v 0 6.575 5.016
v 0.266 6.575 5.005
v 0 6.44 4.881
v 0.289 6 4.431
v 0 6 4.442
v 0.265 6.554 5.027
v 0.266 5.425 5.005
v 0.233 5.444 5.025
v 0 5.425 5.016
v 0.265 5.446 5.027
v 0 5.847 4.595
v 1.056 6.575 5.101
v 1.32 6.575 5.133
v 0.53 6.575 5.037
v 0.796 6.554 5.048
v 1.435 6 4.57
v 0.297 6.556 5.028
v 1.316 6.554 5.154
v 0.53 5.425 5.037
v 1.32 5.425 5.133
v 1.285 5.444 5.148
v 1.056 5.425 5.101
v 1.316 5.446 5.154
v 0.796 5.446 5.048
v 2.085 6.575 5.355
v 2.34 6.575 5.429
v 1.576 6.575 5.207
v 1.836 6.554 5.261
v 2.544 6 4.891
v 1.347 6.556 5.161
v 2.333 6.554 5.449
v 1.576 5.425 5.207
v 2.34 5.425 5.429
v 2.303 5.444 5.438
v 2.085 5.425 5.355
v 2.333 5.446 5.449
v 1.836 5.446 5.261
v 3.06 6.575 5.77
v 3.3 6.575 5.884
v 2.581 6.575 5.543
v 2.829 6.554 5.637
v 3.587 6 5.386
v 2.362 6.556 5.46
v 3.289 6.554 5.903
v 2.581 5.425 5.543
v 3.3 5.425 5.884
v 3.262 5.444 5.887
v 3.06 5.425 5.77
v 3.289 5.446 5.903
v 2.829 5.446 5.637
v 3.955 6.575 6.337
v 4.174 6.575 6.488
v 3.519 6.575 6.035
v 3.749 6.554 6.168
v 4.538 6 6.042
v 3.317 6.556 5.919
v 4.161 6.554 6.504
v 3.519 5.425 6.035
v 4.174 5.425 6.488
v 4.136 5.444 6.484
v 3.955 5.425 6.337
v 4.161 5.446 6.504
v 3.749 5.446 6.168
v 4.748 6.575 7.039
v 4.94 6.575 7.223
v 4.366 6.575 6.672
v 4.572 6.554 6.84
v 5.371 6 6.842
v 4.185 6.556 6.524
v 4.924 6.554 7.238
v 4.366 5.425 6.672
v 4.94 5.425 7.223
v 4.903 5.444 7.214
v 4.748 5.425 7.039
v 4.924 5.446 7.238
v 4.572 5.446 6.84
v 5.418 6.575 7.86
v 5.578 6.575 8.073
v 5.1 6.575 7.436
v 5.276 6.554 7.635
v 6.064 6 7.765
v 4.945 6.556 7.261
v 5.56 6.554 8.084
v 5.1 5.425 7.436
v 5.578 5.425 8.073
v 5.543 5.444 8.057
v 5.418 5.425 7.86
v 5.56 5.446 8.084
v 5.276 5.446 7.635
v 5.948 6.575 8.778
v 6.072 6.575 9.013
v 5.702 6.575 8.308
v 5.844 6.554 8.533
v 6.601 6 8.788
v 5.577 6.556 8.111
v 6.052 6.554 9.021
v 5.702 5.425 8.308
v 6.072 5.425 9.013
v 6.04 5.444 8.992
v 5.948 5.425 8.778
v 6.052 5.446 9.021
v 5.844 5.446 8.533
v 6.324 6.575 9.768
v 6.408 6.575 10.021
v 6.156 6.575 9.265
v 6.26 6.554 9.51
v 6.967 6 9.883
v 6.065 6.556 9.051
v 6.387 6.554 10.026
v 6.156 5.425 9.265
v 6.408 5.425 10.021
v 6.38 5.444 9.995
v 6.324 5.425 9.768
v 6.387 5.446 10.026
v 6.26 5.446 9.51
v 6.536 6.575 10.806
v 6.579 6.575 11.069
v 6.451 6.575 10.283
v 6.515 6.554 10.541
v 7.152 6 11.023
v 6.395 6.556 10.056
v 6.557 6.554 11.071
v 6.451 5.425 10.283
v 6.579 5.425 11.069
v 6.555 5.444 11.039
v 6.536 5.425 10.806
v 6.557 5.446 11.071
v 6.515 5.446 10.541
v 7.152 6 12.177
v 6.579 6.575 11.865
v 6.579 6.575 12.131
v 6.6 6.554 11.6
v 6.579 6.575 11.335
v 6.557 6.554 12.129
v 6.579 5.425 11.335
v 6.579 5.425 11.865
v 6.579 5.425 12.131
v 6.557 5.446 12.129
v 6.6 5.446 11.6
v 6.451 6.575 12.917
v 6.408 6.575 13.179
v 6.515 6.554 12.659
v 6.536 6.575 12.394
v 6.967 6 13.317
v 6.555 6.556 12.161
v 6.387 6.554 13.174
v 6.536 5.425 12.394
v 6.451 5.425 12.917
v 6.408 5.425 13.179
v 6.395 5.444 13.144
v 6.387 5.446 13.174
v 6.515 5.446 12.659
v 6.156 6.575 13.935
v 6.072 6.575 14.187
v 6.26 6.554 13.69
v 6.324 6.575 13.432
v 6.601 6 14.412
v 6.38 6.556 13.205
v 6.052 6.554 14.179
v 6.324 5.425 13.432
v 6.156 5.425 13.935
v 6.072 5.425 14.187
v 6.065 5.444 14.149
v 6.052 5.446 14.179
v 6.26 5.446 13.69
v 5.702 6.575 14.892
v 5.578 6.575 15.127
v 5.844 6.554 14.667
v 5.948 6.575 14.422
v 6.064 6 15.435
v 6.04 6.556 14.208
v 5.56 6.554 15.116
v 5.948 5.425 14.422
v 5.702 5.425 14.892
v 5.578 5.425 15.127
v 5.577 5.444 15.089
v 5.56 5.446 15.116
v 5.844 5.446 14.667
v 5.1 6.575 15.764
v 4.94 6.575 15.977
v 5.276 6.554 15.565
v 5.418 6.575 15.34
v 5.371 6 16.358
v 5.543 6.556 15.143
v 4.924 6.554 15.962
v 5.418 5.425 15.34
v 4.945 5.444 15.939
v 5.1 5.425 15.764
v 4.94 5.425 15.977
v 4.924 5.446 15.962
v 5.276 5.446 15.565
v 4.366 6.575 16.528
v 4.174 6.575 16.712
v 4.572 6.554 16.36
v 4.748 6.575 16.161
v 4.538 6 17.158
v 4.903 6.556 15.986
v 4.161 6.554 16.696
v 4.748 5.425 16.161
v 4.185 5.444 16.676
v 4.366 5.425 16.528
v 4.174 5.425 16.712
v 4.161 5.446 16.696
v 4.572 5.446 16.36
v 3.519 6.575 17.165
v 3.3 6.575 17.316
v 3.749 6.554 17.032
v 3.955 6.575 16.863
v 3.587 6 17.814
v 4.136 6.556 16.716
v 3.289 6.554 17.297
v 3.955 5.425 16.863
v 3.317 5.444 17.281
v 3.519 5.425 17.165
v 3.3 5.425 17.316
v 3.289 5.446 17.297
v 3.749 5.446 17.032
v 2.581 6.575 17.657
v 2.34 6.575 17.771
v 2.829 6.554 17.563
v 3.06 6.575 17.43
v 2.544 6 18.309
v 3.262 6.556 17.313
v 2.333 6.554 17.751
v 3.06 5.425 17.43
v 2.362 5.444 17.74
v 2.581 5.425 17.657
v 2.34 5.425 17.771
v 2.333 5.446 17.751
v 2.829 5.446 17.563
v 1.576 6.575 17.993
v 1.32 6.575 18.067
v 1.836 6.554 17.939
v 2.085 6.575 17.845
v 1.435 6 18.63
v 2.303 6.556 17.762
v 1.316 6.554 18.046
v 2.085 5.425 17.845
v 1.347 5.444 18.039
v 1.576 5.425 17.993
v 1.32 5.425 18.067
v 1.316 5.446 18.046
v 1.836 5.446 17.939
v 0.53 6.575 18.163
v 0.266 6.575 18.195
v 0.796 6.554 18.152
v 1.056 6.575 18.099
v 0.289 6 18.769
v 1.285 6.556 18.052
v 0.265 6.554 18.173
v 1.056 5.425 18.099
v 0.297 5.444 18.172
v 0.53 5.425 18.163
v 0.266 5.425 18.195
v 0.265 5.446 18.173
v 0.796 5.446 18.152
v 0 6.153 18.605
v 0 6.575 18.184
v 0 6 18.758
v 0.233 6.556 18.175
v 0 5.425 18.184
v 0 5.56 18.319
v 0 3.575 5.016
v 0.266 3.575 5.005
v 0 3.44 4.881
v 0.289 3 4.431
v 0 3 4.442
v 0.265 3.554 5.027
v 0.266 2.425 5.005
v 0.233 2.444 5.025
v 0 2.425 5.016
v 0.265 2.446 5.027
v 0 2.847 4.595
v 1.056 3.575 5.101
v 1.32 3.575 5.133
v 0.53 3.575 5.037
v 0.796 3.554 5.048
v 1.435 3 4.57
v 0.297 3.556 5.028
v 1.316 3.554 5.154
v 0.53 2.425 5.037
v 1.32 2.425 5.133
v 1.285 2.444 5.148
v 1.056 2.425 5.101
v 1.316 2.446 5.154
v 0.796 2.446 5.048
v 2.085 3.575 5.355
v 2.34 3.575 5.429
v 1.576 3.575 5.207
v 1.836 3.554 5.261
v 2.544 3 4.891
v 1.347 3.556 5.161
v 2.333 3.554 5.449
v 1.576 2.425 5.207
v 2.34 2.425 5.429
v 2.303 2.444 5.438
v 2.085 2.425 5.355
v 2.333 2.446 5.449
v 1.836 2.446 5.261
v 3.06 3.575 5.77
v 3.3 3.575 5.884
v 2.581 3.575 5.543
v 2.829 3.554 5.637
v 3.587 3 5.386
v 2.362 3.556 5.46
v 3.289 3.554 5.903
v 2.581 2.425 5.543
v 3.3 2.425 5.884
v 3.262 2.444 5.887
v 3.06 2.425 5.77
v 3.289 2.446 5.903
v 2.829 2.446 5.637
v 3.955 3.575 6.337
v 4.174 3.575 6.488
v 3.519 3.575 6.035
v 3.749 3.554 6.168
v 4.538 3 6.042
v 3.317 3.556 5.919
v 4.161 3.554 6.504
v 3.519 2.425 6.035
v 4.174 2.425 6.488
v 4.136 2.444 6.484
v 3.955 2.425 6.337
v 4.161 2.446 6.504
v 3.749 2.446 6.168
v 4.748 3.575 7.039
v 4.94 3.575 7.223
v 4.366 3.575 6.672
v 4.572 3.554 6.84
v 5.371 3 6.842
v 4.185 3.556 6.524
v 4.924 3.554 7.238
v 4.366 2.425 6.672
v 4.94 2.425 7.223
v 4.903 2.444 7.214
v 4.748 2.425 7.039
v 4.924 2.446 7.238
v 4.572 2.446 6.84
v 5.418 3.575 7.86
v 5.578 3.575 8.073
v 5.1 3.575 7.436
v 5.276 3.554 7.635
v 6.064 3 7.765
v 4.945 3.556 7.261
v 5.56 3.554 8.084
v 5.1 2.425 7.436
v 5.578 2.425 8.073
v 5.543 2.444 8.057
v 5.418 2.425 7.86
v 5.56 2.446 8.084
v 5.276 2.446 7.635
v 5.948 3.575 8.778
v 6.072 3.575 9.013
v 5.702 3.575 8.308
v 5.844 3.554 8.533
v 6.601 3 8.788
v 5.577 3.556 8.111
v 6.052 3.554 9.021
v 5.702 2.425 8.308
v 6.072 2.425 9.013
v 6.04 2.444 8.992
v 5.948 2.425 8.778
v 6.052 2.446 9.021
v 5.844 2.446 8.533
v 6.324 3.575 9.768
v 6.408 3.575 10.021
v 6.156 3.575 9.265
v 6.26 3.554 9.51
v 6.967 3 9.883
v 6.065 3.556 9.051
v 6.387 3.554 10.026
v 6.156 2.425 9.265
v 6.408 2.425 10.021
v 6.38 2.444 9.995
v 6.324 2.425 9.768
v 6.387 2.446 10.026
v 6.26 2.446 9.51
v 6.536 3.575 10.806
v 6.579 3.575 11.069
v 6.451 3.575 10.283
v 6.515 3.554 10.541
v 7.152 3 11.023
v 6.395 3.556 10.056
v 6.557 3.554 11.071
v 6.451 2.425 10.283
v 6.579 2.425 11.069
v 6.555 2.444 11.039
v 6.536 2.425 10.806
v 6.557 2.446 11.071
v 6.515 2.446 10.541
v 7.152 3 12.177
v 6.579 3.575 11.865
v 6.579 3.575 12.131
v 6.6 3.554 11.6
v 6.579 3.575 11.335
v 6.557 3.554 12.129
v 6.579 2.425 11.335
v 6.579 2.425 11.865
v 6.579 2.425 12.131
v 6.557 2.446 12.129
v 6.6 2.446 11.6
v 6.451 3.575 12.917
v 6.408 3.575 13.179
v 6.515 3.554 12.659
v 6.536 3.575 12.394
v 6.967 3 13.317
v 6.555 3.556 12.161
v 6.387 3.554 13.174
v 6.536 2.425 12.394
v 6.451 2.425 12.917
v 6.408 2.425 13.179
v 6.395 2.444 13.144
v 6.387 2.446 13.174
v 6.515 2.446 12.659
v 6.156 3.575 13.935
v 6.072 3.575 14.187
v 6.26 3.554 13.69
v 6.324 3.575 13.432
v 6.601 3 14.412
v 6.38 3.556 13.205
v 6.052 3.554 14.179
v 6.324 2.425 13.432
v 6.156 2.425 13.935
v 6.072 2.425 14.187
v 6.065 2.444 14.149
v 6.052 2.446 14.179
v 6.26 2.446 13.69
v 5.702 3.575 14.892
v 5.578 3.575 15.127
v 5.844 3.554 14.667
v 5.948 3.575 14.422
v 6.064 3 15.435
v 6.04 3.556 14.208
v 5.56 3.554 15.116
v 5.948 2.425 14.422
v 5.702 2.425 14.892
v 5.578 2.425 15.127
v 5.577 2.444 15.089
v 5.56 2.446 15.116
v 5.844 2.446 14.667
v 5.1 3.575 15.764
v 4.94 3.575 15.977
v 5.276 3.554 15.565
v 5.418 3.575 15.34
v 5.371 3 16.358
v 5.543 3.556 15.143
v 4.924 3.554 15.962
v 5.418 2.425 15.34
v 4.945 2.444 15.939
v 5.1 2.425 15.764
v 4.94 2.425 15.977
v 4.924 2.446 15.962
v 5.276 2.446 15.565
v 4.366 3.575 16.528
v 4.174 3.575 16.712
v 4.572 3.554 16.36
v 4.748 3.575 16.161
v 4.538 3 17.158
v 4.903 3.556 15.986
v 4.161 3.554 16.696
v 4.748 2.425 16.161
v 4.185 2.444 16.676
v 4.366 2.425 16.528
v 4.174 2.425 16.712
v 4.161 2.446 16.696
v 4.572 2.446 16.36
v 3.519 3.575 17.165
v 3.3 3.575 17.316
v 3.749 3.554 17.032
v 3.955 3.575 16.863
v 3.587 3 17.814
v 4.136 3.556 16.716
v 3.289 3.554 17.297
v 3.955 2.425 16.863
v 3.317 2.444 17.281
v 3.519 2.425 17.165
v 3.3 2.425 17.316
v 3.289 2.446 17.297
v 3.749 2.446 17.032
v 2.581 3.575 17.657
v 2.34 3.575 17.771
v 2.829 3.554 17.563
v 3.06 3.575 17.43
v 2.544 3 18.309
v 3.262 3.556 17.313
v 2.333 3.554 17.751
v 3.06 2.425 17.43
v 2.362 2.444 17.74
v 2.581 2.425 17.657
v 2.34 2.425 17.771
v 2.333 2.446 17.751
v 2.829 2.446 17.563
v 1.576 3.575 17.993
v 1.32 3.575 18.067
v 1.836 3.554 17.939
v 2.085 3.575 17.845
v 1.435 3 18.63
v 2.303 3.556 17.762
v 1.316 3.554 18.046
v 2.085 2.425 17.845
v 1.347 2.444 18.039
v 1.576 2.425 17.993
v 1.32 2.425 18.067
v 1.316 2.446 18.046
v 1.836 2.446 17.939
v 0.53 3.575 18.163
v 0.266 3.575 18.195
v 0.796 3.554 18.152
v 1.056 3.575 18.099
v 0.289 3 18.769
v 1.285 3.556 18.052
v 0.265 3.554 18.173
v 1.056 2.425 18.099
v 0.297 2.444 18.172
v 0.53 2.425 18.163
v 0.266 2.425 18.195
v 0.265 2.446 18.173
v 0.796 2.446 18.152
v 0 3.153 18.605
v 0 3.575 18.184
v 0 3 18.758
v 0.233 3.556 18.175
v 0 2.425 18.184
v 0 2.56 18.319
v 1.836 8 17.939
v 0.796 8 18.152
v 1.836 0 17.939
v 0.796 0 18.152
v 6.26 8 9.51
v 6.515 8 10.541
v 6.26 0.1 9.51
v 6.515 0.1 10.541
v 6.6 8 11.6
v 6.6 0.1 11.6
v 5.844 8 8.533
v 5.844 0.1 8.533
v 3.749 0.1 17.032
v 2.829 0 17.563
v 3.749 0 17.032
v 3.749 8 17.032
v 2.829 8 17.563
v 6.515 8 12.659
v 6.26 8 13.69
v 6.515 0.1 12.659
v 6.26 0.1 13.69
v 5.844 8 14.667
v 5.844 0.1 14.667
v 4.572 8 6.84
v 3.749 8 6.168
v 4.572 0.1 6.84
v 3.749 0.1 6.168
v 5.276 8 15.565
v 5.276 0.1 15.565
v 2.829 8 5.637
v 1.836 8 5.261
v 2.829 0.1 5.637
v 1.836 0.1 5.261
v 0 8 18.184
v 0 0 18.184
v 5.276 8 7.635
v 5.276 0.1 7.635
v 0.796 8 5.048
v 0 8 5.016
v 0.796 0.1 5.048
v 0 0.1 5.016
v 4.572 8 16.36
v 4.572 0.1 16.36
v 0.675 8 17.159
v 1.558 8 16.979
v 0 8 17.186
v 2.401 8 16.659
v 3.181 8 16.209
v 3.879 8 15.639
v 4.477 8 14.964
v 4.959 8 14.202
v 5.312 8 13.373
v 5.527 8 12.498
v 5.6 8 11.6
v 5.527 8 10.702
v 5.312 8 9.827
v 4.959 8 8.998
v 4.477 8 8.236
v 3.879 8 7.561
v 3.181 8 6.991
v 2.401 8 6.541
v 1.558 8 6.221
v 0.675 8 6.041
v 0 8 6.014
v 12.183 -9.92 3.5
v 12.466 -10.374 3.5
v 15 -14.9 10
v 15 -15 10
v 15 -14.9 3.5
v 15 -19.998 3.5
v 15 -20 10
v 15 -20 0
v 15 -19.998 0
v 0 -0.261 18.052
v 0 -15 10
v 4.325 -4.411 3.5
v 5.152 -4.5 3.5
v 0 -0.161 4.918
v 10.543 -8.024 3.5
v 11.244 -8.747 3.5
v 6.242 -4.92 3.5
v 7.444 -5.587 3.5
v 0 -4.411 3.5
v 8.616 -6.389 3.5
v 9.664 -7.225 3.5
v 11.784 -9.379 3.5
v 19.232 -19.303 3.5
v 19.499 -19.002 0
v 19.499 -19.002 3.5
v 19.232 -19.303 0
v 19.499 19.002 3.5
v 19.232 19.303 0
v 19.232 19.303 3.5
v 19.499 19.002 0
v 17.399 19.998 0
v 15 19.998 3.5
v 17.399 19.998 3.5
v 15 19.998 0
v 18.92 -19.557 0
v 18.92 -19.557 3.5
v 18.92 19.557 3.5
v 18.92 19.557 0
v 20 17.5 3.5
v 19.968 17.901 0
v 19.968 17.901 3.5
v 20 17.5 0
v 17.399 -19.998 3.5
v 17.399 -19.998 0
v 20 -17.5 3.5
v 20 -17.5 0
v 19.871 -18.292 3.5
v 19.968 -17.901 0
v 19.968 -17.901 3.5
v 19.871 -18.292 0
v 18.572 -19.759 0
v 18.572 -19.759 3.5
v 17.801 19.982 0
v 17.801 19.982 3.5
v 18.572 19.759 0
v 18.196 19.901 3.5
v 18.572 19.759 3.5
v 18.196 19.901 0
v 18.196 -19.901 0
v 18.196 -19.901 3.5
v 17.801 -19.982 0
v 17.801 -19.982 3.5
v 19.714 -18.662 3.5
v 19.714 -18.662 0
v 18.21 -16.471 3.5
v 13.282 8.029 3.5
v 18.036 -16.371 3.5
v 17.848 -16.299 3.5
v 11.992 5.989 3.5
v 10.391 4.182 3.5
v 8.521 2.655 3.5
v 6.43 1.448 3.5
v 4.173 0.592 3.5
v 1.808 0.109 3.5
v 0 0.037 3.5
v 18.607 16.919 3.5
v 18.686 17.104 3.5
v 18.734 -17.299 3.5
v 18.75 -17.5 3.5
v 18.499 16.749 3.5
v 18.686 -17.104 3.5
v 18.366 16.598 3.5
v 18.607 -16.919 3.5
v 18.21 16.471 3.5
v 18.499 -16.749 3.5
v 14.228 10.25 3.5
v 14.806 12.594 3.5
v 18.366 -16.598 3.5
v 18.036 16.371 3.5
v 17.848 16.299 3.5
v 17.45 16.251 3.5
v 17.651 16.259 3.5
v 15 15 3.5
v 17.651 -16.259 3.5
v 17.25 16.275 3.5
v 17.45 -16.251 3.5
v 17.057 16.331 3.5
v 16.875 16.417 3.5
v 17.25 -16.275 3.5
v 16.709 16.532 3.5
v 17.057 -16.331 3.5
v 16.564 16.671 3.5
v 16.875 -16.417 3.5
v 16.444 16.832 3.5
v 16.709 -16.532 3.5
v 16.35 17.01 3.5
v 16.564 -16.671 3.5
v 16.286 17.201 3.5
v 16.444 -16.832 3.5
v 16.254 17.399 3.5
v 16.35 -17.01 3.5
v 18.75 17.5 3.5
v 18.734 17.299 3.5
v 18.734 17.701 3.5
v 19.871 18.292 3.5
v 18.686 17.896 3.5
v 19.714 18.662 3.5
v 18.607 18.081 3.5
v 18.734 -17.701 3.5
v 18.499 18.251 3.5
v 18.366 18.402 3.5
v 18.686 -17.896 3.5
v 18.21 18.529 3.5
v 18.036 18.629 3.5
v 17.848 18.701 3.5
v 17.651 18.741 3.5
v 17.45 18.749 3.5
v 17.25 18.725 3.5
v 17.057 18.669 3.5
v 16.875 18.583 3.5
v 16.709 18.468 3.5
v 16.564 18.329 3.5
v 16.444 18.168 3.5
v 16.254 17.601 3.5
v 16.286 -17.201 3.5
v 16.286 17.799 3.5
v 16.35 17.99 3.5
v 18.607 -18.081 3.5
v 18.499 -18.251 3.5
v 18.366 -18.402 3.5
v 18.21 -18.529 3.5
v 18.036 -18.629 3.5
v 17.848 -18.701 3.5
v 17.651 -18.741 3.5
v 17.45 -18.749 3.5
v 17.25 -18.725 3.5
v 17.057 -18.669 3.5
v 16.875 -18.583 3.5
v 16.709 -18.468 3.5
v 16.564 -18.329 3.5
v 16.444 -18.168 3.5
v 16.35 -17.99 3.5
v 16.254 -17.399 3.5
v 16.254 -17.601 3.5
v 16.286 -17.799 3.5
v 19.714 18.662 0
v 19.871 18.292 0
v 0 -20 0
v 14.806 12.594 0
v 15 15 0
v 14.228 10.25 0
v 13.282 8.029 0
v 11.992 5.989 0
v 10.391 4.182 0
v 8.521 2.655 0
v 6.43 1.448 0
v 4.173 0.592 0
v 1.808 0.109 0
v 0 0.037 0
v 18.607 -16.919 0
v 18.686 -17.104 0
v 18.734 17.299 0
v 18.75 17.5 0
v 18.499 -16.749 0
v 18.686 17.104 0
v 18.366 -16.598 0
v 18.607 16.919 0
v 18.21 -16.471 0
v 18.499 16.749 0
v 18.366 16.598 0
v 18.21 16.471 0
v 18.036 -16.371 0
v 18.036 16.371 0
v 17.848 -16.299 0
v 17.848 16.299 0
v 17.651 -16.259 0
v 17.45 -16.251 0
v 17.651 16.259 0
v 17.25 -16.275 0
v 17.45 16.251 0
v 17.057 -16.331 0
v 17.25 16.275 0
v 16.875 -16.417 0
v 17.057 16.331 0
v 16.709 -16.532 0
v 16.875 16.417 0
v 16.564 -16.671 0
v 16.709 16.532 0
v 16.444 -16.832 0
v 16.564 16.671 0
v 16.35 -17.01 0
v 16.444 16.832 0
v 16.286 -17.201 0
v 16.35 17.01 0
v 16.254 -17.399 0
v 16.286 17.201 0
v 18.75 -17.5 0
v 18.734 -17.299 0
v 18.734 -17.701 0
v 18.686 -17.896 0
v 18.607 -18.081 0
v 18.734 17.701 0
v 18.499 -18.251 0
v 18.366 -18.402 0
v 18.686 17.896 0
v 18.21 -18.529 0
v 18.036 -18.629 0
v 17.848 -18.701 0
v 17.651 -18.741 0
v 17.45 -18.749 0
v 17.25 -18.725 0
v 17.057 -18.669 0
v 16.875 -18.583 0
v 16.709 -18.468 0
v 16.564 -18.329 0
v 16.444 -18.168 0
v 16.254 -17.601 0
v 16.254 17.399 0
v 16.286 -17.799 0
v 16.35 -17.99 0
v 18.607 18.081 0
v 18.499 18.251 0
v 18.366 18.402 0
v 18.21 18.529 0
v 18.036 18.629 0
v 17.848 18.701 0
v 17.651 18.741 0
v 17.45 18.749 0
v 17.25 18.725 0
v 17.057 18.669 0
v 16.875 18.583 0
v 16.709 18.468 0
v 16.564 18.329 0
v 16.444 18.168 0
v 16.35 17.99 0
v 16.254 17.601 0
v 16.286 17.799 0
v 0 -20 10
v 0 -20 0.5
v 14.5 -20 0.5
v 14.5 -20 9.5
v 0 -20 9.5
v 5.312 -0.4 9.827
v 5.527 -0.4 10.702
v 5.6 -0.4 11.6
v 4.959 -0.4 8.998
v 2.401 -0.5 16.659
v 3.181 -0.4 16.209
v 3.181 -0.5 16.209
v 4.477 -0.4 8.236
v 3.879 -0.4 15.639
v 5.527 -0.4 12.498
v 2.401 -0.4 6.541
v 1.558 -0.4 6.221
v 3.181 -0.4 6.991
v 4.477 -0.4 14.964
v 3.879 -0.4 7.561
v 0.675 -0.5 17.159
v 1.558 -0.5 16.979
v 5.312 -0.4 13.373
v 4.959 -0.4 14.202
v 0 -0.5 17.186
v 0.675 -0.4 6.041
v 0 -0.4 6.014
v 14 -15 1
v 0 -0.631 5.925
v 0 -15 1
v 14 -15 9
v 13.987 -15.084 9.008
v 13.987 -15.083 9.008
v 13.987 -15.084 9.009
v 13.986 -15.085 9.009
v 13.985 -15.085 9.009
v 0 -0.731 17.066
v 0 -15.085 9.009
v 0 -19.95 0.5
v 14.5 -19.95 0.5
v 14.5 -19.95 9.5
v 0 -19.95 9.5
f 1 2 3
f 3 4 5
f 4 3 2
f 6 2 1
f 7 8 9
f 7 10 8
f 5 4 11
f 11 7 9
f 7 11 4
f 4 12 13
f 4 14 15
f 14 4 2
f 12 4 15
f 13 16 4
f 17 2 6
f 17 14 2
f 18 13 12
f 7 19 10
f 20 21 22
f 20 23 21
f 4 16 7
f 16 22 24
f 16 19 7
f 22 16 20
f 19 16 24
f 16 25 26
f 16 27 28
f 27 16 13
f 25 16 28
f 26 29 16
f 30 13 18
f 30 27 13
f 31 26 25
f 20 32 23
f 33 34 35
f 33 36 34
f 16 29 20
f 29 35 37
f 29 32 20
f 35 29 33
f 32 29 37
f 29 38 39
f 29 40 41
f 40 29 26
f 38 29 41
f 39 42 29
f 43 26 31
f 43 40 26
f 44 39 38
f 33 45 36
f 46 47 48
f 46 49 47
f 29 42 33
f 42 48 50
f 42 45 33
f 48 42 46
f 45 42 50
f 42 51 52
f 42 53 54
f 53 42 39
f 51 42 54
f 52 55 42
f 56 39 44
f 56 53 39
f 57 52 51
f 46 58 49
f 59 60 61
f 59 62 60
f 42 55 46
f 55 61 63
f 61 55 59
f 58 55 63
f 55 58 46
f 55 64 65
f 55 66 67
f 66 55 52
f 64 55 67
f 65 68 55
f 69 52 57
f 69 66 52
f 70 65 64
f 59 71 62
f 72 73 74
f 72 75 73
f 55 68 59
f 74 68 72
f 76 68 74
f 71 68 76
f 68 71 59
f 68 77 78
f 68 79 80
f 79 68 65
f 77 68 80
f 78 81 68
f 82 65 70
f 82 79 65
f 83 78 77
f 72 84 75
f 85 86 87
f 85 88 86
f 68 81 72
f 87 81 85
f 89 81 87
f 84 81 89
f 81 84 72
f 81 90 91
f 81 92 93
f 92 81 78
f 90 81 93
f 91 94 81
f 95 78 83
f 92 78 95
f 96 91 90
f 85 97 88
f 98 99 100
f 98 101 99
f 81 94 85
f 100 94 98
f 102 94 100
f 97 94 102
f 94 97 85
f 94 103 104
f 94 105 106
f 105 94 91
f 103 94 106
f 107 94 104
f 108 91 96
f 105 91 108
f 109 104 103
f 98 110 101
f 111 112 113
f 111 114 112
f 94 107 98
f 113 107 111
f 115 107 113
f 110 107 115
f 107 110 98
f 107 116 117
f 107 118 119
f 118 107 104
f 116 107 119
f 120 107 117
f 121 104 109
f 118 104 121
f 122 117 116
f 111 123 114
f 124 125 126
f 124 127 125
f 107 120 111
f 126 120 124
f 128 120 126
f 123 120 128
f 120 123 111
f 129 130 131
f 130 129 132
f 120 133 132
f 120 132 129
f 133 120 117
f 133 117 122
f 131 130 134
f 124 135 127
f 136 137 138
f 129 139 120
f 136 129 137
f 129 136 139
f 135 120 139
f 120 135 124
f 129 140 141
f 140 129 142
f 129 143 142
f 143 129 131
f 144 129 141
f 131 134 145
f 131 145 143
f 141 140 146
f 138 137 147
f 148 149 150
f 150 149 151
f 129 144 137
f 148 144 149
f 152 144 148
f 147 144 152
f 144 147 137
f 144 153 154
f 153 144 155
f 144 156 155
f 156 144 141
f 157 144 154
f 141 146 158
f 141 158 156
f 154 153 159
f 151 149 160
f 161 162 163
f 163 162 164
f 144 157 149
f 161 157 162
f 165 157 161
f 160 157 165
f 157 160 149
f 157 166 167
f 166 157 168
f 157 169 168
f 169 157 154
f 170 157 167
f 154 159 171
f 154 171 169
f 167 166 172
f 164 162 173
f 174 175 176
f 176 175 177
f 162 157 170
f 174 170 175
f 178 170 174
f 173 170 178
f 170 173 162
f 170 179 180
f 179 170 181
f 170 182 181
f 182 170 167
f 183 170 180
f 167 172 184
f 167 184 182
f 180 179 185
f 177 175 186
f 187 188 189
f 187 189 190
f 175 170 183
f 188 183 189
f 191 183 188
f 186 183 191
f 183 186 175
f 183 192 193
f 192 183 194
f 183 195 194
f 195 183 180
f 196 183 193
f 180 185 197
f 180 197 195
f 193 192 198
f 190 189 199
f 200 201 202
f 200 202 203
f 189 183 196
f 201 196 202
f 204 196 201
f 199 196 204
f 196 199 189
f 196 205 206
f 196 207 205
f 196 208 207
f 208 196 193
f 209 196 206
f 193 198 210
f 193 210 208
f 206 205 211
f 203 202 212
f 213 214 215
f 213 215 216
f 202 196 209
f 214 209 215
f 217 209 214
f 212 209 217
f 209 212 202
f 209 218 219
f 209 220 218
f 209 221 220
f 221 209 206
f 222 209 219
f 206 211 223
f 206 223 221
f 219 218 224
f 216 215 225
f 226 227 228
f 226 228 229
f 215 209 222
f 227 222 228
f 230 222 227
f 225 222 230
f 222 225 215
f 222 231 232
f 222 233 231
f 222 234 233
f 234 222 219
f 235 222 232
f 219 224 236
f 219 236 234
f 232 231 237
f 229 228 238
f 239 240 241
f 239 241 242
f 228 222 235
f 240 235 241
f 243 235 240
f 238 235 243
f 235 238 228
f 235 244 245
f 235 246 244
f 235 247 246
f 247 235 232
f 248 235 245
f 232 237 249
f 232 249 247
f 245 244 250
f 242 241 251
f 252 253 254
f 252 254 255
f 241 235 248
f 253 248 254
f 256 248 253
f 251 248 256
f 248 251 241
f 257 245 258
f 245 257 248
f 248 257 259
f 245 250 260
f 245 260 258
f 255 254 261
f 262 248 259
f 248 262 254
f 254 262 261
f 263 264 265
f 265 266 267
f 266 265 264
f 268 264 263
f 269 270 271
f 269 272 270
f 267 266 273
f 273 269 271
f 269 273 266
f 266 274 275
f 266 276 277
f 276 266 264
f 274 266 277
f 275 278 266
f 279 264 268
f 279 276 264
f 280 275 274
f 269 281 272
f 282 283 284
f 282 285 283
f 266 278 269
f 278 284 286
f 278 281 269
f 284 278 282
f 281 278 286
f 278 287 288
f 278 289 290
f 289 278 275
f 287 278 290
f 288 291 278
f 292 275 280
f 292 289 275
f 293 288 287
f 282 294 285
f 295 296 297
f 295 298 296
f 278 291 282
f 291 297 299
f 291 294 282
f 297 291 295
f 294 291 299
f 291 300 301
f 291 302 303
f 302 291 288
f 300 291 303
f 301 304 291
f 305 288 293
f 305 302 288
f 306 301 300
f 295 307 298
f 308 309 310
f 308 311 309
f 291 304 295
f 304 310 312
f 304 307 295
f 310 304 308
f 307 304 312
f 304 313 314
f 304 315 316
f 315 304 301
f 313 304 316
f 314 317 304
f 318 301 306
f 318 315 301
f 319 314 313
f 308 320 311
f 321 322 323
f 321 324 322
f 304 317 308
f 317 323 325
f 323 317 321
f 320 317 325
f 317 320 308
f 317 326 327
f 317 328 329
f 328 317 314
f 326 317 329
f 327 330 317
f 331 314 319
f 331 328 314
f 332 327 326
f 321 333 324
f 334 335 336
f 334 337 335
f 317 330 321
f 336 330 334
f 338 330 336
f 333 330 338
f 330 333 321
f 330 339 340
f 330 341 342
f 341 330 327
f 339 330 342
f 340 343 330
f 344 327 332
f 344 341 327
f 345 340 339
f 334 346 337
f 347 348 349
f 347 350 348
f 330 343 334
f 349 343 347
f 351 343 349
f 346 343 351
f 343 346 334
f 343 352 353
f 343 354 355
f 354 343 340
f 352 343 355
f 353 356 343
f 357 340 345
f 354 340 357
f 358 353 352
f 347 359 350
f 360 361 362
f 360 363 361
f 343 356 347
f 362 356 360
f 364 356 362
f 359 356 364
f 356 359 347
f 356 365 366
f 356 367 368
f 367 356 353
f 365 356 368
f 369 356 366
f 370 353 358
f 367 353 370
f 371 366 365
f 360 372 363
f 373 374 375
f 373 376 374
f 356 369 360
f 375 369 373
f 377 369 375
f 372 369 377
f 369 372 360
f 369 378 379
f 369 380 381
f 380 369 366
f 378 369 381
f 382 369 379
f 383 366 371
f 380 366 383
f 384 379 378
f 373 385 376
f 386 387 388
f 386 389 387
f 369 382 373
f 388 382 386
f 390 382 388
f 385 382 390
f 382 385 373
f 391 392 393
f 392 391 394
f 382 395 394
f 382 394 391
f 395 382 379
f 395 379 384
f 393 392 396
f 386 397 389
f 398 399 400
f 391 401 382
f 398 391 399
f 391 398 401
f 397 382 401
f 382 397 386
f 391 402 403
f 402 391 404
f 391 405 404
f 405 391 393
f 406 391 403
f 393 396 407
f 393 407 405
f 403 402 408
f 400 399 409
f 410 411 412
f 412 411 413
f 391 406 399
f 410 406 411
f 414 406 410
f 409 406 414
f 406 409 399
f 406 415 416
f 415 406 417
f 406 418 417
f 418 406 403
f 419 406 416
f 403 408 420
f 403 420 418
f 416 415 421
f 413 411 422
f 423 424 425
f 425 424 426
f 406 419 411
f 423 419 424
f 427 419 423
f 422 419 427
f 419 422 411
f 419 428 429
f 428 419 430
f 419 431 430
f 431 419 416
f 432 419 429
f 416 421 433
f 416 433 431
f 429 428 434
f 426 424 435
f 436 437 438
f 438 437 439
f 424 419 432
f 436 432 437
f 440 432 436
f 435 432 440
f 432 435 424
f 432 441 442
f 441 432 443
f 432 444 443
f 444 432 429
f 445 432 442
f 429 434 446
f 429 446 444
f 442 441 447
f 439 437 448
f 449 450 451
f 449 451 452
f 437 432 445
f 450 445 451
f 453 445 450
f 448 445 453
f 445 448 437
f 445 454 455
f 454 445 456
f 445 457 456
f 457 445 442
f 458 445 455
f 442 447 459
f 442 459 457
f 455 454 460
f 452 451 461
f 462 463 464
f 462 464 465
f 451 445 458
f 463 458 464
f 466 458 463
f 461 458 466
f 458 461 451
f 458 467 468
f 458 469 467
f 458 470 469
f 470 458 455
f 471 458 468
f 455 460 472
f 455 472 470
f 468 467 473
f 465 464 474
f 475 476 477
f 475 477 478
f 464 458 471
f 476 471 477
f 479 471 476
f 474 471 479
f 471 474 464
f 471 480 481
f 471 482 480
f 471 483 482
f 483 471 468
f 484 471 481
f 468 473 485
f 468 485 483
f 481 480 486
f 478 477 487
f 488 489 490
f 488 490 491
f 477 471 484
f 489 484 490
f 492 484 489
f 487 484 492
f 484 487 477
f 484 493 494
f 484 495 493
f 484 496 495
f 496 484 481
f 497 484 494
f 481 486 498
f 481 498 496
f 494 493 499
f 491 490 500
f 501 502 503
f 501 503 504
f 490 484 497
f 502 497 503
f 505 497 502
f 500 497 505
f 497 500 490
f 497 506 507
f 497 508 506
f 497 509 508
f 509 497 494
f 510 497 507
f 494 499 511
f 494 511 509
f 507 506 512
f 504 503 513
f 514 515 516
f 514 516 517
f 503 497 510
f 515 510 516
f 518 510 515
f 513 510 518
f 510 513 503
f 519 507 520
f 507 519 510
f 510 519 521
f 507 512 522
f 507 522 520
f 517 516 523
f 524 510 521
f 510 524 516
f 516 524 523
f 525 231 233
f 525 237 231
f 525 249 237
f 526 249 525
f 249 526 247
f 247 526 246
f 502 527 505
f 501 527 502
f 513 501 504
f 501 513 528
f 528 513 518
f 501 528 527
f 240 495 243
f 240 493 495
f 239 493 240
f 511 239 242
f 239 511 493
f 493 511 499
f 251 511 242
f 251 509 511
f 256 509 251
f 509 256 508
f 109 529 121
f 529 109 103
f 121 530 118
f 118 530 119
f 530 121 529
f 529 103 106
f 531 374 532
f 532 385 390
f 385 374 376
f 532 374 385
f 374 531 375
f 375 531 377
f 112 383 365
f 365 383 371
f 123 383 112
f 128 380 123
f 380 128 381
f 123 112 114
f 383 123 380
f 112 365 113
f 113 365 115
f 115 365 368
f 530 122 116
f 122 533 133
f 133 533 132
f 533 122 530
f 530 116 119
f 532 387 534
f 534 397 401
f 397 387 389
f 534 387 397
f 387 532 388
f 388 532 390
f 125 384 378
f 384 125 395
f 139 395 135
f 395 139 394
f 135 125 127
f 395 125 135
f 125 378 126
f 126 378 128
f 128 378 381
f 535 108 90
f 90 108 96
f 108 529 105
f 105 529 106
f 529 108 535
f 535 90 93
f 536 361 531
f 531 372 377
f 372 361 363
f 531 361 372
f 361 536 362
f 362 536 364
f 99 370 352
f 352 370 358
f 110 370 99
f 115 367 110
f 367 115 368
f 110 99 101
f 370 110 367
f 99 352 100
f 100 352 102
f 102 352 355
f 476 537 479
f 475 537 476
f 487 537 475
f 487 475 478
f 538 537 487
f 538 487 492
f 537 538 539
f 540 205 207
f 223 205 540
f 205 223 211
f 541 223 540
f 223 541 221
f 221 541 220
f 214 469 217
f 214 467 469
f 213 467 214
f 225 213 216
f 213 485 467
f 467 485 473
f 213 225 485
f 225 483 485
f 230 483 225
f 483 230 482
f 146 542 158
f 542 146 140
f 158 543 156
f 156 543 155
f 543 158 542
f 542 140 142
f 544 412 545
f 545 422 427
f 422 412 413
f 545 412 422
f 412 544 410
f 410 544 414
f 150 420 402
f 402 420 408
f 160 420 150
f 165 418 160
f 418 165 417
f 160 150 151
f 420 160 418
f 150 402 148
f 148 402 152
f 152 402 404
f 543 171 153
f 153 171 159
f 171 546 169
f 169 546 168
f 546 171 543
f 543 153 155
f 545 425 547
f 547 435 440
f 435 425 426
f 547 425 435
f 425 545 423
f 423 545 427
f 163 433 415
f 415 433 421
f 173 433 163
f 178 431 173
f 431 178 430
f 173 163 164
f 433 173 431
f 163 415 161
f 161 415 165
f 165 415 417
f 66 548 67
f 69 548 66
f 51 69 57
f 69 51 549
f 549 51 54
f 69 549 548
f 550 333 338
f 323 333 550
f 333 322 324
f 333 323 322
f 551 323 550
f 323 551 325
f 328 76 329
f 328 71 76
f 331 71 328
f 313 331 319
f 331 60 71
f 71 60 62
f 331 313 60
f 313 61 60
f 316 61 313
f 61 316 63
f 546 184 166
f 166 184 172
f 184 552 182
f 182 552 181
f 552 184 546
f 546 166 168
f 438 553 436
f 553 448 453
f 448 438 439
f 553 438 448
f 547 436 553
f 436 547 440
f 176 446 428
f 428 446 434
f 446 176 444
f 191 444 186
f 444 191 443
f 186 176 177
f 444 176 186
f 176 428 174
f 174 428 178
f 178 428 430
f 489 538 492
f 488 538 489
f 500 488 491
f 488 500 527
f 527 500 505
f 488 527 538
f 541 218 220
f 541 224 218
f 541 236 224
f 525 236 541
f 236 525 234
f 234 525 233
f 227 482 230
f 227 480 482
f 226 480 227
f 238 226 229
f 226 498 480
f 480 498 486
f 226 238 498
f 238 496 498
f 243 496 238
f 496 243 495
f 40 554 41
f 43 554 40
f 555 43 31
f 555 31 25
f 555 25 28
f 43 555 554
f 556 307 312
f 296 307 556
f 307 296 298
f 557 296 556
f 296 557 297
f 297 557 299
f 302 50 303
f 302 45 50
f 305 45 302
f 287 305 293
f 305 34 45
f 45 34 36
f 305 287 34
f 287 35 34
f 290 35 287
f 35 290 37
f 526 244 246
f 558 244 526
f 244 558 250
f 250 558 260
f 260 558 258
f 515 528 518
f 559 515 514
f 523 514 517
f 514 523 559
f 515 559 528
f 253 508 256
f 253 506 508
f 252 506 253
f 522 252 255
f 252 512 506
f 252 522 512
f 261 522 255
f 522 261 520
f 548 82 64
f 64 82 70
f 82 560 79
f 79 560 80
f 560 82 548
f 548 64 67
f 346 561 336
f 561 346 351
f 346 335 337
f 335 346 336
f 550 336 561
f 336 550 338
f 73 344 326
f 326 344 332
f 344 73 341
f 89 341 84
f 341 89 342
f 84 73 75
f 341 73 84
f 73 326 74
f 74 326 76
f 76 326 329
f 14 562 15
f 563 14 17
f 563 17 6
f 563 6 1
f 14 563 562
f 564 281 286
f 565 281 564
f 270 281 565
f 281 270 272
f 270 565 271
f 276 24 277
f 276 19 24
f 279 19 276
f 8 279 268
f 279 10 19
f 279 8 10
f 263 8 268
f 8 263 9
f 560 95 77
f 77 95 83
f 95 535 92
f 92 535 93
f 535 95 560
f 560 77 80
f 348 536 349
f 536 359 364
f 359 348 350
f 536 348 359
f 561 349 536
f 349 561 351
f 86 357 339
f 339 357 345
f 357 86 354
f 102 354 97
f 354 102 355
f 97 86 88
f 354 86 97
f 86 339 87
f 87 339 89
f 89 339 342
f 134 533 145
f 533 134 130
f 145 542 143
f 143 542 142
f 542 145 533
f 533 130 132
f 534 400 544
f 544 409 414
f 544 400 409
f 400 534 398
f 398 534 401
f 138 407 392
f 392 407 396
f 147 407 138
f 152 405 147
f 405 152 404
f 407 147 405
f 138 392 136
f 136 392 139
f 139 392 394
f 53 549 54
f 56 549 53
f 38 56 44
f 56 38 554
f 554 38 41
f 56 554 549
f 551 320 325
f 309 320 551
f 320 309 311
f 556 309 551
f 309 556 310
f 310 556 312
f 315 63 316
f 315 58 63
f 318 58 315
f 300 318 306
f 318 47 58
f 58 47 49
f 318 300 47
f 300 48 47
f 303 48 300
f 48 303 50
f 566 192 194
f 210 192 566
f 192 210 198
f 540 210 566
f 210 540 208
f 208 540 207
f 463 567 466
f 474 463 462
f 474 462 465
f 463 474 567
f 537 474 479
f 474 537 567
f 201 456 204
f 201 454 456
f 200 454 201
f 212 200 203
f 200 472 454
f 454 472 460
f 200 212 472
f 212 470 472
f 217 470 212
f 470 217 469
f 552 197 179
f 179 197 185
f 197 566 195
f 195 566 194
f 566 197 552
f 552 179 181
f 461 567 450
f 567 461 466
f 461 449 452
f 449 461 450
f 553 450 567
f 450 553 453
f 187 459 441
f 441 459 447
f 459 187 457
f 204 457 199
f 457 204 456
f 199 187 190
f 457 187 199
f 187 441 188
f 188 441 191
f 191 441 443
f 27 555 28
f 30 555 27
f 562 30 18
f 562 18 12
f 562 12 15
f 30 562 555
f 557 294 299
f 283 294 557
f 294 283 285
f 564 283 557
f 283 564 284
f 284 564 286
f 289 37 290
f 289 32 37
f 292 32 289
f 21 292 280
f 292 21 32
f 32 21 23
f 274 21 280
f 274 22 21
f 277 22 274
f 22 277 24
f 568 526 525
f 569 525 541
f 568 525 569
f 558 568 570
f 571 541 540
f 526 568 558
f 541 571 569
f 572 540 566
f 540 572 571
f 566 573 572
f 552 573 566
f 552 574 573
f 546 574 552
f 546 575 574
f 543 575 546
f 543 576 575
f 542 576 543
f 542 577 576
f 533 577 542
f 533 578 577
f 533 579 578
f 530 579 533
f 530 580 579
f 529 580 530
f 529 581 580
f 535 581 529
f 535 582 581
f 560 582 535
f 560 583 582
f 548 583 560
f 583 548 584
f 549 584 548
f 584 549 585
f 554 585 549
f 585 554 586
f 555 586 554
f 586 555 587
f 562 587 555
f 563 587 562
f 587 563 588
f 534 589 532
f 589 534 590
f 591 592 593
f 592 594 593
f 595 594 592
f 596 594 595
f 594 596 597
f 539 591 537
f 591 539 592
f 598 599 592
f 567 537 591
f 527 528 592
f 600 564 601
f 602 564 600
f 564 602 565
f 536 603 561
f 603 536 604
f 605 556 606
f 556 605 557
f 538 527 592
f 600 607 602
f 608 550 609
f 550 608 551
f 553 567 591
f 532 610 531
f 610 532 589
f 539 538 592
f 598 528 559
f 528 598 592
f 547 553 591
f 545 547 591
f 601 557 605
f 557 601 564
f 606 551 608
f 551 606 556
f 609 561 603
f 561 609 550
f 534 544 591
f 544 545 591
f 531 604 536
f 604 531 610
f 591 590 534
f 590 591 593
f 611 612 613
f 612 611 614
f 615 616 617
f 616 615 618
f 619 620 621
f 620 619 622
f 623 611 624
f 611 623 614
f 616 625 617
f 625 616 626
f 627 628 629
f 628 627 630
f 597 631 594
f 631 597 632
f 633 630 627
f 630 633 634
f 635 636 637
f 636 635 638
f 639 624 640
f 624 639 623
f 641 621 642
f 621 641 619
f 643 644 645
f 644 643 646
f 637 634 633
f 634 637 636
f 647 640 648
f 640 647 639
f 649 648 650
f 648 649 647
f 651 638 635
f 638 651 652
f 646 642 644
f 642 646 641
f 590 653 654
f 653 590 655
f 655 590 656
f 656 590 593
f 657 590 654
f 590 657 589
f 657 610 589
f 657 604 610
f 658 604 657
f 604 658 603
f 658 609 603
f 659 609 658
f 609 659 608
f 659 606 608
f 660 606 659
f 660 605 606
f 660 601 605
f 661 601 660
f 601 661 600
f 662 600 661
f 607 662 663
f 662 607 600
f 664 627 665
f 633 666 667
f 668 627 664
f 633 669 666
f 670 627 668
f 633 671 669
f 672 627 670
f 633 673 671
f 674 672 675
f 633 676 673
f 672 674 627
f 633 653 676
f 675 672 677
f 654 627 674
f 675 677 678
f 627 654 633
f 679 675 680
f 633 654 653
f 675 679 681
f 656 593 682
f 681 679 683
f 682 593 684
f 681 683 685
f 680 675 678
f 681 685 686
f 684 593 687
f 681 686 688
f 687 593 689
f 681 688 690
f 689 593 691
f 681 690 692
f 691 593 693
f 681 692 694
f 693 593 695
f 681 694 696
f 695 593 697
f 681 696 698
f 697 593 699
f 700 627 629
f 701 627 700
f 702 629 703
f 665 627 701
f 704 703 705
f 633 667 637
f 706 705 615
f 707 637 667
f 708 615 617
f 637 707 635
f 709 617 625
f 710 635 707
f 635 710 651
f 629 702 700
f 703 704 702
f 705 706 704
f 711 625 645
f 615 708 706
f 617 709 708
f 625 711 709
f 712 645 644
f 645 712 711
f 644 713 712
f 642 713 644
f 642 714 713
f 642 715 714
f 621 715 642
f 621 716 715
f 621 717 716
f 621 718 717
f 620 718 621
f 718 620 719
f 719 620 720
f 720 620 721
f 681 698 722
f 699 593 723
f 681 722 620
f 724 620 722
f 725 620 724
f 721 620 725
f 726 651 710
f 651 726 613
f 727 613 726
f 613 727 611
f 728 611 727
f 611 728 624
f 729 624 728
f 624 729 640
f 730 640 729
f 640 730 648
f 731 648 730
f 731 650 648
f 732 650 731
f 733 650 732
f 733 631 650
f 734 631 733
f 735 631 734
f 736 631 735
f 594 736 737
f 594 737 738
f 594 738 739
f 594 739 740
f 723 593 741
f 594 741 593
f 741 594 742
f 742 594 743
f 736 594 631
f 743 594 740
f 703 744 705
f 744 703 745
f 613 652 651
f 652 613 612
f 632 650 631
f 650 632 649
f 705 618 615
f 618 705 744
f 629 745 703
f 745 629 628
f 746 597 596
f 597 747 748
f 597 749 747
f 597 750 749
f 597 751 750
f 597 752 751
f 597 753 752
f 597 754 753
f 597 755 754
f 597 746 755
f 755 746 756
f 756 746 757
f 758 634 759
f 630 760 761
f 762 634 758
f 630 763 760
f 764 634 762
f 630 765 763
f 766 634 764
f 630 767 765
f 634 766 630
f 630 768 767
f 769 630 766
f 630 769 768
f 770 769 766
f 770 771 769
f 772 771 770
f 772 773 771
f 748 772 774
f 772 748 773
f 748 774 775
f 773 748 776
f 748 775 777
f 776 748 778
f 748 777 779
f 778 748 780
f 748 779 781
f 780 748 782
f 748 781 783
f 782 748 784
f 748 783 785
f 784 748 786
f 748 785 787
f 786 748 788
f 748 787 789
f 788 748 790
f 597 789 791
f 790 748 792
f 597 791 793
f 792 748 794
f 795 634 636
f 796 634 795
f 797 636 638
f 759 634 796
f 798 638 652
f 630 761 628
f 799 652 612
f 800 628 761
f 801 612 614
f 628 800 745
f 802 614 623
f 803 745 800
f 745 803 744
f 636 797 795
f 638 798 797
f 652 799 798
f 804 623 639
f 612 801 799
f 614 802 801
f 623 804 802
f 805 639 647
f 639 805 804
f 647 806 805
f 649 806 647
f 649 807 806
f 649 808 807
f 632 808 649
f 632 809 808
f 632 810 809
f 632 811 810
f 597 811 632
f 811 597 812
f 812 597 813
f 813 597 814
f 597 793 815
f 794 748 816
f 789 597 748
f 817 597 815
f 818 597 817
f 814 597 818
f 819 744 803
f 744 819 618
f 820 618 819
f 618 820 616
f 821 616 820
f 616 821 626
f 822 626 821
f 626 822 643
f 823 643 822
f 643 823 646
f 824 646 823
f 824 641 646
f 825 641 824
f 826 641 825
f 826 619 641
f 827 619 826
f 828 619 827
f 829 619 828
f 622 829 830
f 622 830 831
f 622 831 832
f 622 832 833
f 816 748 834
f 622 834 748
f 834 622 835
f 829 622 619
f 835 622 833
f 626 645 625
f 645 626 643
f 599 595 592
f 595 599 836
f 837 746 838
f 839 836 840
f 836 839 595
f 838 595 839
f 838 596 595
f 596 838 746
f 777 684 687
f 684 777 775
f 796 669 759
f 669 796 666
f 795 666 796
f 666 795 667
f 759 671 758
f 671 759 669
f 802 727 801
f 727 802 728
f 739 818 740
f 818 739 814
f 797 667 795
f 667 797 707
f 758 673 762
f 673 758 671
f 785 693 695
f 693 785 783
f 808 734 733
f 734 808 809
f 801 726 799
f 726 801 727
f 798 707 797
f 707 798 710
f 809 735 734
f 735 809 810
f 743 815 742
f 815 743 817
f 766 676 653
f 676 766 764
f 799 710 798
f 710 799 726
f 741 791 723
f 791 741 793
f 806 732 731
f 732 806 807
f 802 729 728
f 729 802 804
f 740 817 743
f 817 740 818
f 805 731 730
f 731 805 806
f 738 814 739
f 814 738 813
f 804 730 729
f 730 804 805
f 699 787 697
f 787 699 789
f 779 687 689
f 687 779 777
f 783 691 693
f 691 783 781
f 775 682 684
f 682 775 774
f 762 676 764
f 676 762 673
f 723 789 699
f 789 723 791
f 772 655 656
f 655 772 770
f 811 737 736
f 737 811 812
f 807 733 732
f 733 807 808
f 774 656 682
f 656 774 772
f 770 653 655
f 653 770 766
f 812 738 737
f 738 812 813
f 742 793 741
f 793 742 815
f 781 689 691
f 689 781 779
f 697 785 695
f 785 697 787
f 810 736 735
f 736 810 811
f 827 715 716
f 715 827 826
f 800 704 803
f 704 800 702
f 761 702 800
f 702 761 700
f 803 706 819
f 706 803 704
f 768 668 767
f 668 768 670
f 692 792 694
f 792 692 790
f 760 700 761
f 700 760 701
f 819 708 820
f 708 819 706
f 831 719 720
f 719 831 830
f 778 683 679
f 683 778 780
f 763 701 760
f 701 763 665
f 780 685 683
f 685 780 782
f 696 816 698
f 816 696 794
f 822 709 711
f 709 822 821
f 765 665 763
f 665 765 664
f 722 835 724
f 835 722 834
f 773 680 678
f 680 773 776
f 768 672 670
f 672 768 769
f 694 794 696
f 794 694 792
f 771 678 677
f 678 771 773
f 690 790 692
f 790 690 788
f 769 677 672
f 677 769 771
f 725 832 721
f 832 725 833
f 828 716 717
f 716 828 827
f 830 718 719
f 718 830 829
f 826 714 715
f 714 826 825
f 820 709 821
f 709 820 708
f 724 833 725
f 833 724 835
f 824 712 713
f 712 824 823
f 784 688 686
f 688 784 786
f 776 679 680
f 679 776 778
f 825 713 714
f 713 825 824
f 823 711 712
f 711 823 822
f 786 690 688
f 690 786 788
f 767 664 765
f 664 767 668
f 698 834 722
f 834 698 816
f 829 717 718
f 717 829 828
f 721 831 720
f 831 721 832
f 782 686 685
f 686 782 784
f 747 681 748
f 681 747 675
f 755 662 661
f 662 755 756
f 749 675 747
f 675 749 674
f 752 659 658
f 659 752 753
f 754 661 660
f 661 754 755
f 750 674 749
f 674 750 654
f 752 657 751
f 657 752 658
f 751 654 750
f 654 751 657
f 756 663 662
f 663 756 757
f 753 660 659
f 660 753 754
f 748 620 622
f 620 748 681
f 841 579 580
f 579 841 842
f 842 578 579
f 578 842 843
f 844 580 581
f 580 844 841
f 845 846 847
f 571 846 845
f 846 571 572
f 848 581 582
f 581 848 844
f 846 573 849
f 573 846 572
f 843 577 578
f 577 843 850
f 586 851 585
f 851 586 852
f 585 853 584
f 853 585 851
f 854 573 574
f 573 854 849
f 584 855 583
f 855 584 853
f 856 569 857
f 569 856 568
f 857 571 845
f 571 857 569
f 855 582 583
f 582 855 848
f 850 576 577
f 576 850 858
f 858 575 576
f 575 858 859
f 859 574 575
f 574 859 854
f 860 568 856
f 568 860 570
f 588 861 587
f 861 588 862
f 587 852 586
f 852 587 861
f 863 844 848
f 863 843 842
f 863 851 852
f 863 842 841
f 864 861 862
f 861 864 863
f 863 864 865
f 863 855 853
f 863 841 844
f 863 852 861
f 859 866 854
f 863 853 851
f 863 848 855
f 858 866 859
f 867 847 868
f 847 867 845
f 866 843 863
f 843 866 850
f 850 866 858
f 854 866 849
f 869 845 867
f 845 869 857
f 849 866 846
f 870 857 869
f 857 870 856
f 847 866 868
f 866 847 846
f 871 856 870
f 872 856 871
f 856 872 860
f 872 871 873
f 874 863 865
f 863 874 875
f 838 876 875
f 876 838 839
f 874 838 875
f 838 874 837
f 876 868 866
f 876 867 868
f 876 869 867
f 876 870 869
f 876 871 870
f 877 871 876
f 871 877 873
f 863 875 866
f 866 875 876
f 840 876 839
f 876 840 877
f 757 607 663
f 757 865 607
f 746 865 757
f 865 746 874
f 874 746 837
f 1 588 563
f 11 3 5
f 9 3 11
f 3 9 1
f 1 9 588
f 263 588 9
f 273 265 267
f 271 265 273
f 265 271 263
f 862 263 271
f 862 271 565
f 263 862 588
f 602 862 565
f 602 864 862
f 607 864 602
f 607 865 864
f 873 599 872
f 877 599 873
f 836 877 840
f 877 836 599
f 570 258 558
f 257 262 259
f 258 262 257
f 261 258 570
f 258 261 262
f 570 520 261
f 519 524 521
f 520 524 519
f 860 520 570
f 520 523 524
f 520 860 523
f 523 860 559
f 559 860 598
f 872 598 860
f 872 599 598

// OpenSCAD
module e3d_v5_0()
translate([0,0,69.7]) // z-lenght
rotate([90,0,-90]) translate([4,-64.2,0]) import(file="E3Dv5.STL");

module anycubic_effector0()
rotate([0,0,120]) // orientation
translate([-170+1.7,-50+1.3,-7/2])
import(file="effector_Anycubic.stl",convexity=5);

module blower4010()
import(file="../../model-fan-air-compress/4010_Blower_Fan_v2.stl");

module anycubic_effector()
{
    h=7; eoffset=31; edist=43;
    module base() {
        w1=21.94; emnt=12.1; d0=3.65;
        d1=sqrt(emnt*emnt+h*h);
        h1=tan(90-55)*(d1-d0);
        hull() for(a=[0,120,240]) rotate([0,0,a])
            translate([-w1/2,eoffset-0.1,-h/2]) cube([w1,0.1,h]);
        for(a=[0,120,240]) rotate([0,0,a]) translate([0,eoffset]) 
            intersection() {
                cube([edist,emnt,h],center=true);
                hull() for(j=[0,1]) mirror([j,0]) translate([-edist/2,0]) 
                       rotate([0,90]) cylinder(d1=d0,d2=d1,h=h1,$fn=31);
            }
    }
    module quad(m) for(x=[-1,1]*m.x/2,y=[-1,1]*m.y/2) translate([x,y])
            children();
    module mounts() {
        $fn=30;
        h0=h*3;
        cw=16.4;cy=13.1;
        aw=26; ah=8; ay=18.5; // duct slot 26x8, center offset 18.5
        // extruder
        cylinder(d=25,h=h0,$fn=50); 
        translate([-cw/2,-cy]) cube([cw,cy,h0]);
        // extruder mnt
        translate([0,-1.6])quad([33,19]) cylinder(d=3.2,h=h0); 
        translate([0,ay]) { // air 
            translate(-[aw,ah]/2) cube([aw,ah,h0]); // duct
            translate([0,-.4])quad([24,14]) cylinder(d=2.5,h=h0); // mnt
        }
        // arm nut
        for(a=[0,120,240]) rotate([0,0,a]) translate([0,eoffset,h])
            rotate([0,90]) cylinder(d=3,h=edist+5,center=true);
    }
    difference() {
        base();
        translate([0,0,-h]) mounts();
    }
}

module e3d_v5()
{
    $fn=40;
    module z(v)translate([0,0,v])children();
    module mnt() {
        cylinder(d=16,h=3);
        cylinder(d=12,h=12.3);
        z(3+5.6) cylinder(d=16,h=3.7);
    }
    module cooler() {
        for(m=[0:3.4:33])z(m)cylinder(d=25,h=1.2);
        z(34)cylinder(d=16,h=1.5);
    }
    module heaterblock() {
        w=16;h=12;d=16;y=12;
        translate([-w/2,-y,0]) cube([w,d,h]);
        translate([0,-7,h/2+1])
            rotate([0,90])cylinder(d=6.2,h=22,center=true);
    }
    module nozzle() {
        cylinder(d1=1.2,d2=6,h=3.43);
        z(2) cylinder(d=9.24,h=3,$fn=6);
    }
    module drill() {
        // mount
        z(57) cylinder(d=7,h=4);
        z(59.57) cylinder(d=9.8,h=12);
        // cooler
        z(19.5) cylinder(d=3,h=2);
        z(20) cylinder(d=15,h=15);
        z(35) cylinder(d=13,h=4);
        z(39) cylinder(d=9,h=17);
        // heater
        z(5.4) cylinder(d=6,h=13);
        // nozzle
        z(2.5) cylinder(d=6,h=2.6);
        z(2) cylinder(d=2,h=1);
        z(0) cylinder(d1=0.46,d2=2,h=2.01);
        z(-1) cylinder(d=0.46,h=7);
    }
    difference() {
        union() {
            z(57.4)mnt();
            z(19.6)cooler();
            z(5.5) heaterblock();
            nozzle();
        }
        drill();
    }
}

module blower4010_box()
{
    sz=40; h=10;
    mnt=35; dr=5;
    dv=29.8; xv=3; // vent. in diameter, offset
    wall=1;
    r_do=28; // rotor outer
    r_di=21; // rotor inner
    r_dh=17; // rotor hub diameter
    r_db=24; // rotor base diameter
    r_hb=2.3;// rotor base height
    r_h=7.0; // rotor height
    r_n=29;  // rotor foils
    $fn=39;
    dsz=mnt-dr-wall*2;
    module move_mnt() for(x=[-mnt,mnt]/2, y=[-mnt,mnt]/2)
            translate([x,y]) children();
    module mirror4() for(i=[0,1],j=[0,1])mirror([i,0])mirror([0,j])
            children();
    module r1square(d,x) hull() {
        circle(d=d);
        translate([-d/2,0])square([x,x-d/2]);
        translate([0,-d/2])square([x-d/2,x]);
    }
    module outline() difference() {
        translate(-[sz,sz]/2)square(sz);
        // corners
        mirror4() translate([mnt,mnt]/2) r1square(dr,dr);
    }
    module mnt_ears() intersection() {
        r1square(dr+wall,dr+wall);
        rotate([0,0,180])r1square(dr,dr);
        }
    // bottom
    linear_extrude(wall) outline();
    // base
    linear_extrude(h) difference() {
        outline();
        offset(-wall) outline();
        translate([-dsz/2,-sz/2-1])square([dsz,sz/2+1]);
    }
    // cover
    translate([0,0,h-wall]) linear_extrude(wall)
        difference() { outline(); translate([xv,0])circle(d=dv); }
    // mount ears
    translate([0,0,2])
        mirror4() linear_extrude(1.5) translate([mnt,mnt]/2)
        difference() { mnt_ears(); circle(d=2); }
}

// M=mode 1=outer,2=inner,3=wall
module to_tube(M=3, ztube=20, tube=13.2, htube=8, wall=1,R=[0,0,0],T=[0,0,0])
{
    dex=2.3; trifl=3; lt=4; // tube grip extend, step, lock type 4/24
    w0=wall/10;
    dx=(M<2?0:wall);
    // outlet
    translate([0,0,ztube-dx/2])
        cylinder(d=tube-dx*2,h=htube+dx);
    // locks
    if (M==1) for(z=[0,trifl])
            translate([0,0,ztube+htube-2-z])
            rotate_extrude(convexity=5) 
                translate([tube/2,0])
                circle(r=(dex)/4,$fn=lt);  
    // transition
    hull() {
        translate([0,0,ztube-dx/2]) cylinder(d=tube-dx*2,h=w0);
        translate(-[0,0,(M<2?0:w0)]) translate(T)
        rotate(R)linear_extrude(height=w0)
        offset(delta=-dx)children();
    }
}

// blower b-part connection
module bconnect()
{
    sz=40; h=10;
    mnt=35; dr=5;
    wall=1;
    tube=13.2;
    xtube=6.6;
    ed=5; // extra duct
    $fn=39;
    dsz=mnt-dr;

    module base() {
        // base
        hull() for(x=[-1,1]*mnt/2,y=[-1,1]*mnt/2)
            translate([x,y]) cylinder(d=dr,h=3.5);
        translate([dsz,sz]/-2)cube([dsz,ed+.05,h]);
        translate([0,-sz/2+ed,h/2+xtube])rotate([-90,0])
        to_tube(1,ztube=sz/2-ed,tube=tube)
            translate([0,xtube])square([dsz,h],center=true);
    }
    module hole() {
        // drills
        for(x=[-1,1]*mnt/2,y=[-1,1]*mnt/2) translate([x,y]) 
            cylinder(d=2+.5,h=10,center=true);
        // mount cut
        translate([0,dsz/2]) {
            cylinder(d=dsz,h=3.5*2+.1,center=true);
            translate([0,dsz/2])
            cube([dsz,dsz,3.5*2+.1],center=true);
        }
        // out duct
        hull() 
        translate([0,-sz/2,h/2]) {
            cube([dsz-wall*2,2*ed,h-wall*2],center=true);
            cube([dsz-wall,.1,h-wall],center=true);
        }
        translate([0,-sz/2+ed,h/2+xtube])rotate([-90,0])
        to_tube(2,ztube=sz/2-ed,tube=tube)
            translate([0,xtube])square([dsz,h],center=true);
    }
    difference() {
        base();
        hole();
    }
}

// blower a-part connection
module aconnect(part=3)
{
    sz=40; h=10;
    mnt=35; dr=5; bh=3.5;
    slmnt=60; // slot mount distance
    wall=1;
    tube=13.2;
    tex=15.5; trifl=3; // tube grip extend, step
    htube=8;
    xtube=5;
    $fn=39;
    dsz=mnt-dr;

    module base1() {
        // main plate
        translate([sz,sz]/-2-[0,bh])cube([sz,sz+bh,bh]);
        // slot mounting
        hull() for(x=[-.5,.5]*slmnt) translate([x,0])
            cylinder(d=slmnt-sz,h=bh);
    }
    module base2() {
        // transition
        hull() {
            translate([-dsz/2,-sz/2-wall,bh])
            cube([dsz,wall,h]);
            translate([0,-sz/2-wall-sz/4,bh+tube/2])
            rotate([-90,0])
            cylinder(d=tube,h=wall);
        }
        // vert
        translate([-sz/2,-sz/2-bh])
            cube([sz,bh,h+bh]);
        // out
        translate([0,-sz/2-sz/4,bh+tube/2])
            rotate([90,0])
            cylinder(d=tube,h=htube+wall);
        // locks
        translate([0,-sz/2-sz/4,bh+tube/2])
            rotate([90,0])for(z=[trifl,2*trifl])
            translate([0,0,z])
            rotate_extrude(convexity=5) 
                translate([tube/2,0])
                circle(r=(tex-tube)/4);             
    }
    module holes1() {
        // enlighteemnt
        translate([0,0,-1])
            cylinder(d=sz/1.5,h=bh+2);
        // blower mount
        for(x=[-.5,.5]*mnt,y=[-.5,.5]*mnt)
            translate([x,y,-1])
            cylinder(d=1.5,h=bh+2);
        // slot mount
        for(x=[-.5,.5]*slmnt) translate([x,0,-1])
            cylinder(d=4,h=bh+2);
    }
    module holes2() {
        // transition
        hull() {
            translate([-dsz/2+wall,-sz/2-wall,bh+wall])
            cube([dsz-2*wall,wall+1,h-2*wall]);
            translate([0,-sz/2-wall-sz/4-.01,bh+tube/2])
            rotate([-90,0])
            cylinder(d=tube-2*wall,h=wall);
        }        
        // out
        translate([0,-sz/2-sz/4,bh+tube/2])
            rotate([90,0])
            cylinder(d=tube-2*wall,h=htube+wall*2);
    }
    module trpz(w,h) let(a=55, w1=w-2*h/tan(a))
        polygon([[-w/2,0],[w/2,0],[w1/2,h],[-w1/2,h],[-w/2,0]]);
    module lasti() translate([0,-sz/2,-1])
        rotate([0,0,180])
        linear_extrude(bh+2) 
        offset(delta=0.05)trpz(sz/2,bh);
    module lasto() translate([0,-sz/2,-1])
        rotate([0,0,180])
        linear_extrude(bh+1)
        offset(delta=.05)
        difference(){
            translate([-sz/2,0])square([sz,bh]);
            trpz(sz/2,bh);
        }
    if (part>=2)difference() { base1(); holes1(); lasti(); }
    if (part%2==1)difference() { base2(); holes2(); lasto(); }
}


module anycubic_assembly()
{
translate([0,0,-18.8-7/2]) // effector offset
    e3d_v5();
    anycubic_effector();
    translate([0,29/2,40/2+7/2])rotate([90,0,180])
        blower4010();
}

//anycubic_assembly();
//anycubic_effector();
//anycubic_effector0();
//blower4010();
//%blower4010_box();
cutx()
bconnect();
//translate([0,0,-3.5])
//aconnect(1);
//e3d_v5();
//e3d_v5_0();

module cutx() intersection() {
    children();
    translate([500,0]) cube(1000,center=true);
}
